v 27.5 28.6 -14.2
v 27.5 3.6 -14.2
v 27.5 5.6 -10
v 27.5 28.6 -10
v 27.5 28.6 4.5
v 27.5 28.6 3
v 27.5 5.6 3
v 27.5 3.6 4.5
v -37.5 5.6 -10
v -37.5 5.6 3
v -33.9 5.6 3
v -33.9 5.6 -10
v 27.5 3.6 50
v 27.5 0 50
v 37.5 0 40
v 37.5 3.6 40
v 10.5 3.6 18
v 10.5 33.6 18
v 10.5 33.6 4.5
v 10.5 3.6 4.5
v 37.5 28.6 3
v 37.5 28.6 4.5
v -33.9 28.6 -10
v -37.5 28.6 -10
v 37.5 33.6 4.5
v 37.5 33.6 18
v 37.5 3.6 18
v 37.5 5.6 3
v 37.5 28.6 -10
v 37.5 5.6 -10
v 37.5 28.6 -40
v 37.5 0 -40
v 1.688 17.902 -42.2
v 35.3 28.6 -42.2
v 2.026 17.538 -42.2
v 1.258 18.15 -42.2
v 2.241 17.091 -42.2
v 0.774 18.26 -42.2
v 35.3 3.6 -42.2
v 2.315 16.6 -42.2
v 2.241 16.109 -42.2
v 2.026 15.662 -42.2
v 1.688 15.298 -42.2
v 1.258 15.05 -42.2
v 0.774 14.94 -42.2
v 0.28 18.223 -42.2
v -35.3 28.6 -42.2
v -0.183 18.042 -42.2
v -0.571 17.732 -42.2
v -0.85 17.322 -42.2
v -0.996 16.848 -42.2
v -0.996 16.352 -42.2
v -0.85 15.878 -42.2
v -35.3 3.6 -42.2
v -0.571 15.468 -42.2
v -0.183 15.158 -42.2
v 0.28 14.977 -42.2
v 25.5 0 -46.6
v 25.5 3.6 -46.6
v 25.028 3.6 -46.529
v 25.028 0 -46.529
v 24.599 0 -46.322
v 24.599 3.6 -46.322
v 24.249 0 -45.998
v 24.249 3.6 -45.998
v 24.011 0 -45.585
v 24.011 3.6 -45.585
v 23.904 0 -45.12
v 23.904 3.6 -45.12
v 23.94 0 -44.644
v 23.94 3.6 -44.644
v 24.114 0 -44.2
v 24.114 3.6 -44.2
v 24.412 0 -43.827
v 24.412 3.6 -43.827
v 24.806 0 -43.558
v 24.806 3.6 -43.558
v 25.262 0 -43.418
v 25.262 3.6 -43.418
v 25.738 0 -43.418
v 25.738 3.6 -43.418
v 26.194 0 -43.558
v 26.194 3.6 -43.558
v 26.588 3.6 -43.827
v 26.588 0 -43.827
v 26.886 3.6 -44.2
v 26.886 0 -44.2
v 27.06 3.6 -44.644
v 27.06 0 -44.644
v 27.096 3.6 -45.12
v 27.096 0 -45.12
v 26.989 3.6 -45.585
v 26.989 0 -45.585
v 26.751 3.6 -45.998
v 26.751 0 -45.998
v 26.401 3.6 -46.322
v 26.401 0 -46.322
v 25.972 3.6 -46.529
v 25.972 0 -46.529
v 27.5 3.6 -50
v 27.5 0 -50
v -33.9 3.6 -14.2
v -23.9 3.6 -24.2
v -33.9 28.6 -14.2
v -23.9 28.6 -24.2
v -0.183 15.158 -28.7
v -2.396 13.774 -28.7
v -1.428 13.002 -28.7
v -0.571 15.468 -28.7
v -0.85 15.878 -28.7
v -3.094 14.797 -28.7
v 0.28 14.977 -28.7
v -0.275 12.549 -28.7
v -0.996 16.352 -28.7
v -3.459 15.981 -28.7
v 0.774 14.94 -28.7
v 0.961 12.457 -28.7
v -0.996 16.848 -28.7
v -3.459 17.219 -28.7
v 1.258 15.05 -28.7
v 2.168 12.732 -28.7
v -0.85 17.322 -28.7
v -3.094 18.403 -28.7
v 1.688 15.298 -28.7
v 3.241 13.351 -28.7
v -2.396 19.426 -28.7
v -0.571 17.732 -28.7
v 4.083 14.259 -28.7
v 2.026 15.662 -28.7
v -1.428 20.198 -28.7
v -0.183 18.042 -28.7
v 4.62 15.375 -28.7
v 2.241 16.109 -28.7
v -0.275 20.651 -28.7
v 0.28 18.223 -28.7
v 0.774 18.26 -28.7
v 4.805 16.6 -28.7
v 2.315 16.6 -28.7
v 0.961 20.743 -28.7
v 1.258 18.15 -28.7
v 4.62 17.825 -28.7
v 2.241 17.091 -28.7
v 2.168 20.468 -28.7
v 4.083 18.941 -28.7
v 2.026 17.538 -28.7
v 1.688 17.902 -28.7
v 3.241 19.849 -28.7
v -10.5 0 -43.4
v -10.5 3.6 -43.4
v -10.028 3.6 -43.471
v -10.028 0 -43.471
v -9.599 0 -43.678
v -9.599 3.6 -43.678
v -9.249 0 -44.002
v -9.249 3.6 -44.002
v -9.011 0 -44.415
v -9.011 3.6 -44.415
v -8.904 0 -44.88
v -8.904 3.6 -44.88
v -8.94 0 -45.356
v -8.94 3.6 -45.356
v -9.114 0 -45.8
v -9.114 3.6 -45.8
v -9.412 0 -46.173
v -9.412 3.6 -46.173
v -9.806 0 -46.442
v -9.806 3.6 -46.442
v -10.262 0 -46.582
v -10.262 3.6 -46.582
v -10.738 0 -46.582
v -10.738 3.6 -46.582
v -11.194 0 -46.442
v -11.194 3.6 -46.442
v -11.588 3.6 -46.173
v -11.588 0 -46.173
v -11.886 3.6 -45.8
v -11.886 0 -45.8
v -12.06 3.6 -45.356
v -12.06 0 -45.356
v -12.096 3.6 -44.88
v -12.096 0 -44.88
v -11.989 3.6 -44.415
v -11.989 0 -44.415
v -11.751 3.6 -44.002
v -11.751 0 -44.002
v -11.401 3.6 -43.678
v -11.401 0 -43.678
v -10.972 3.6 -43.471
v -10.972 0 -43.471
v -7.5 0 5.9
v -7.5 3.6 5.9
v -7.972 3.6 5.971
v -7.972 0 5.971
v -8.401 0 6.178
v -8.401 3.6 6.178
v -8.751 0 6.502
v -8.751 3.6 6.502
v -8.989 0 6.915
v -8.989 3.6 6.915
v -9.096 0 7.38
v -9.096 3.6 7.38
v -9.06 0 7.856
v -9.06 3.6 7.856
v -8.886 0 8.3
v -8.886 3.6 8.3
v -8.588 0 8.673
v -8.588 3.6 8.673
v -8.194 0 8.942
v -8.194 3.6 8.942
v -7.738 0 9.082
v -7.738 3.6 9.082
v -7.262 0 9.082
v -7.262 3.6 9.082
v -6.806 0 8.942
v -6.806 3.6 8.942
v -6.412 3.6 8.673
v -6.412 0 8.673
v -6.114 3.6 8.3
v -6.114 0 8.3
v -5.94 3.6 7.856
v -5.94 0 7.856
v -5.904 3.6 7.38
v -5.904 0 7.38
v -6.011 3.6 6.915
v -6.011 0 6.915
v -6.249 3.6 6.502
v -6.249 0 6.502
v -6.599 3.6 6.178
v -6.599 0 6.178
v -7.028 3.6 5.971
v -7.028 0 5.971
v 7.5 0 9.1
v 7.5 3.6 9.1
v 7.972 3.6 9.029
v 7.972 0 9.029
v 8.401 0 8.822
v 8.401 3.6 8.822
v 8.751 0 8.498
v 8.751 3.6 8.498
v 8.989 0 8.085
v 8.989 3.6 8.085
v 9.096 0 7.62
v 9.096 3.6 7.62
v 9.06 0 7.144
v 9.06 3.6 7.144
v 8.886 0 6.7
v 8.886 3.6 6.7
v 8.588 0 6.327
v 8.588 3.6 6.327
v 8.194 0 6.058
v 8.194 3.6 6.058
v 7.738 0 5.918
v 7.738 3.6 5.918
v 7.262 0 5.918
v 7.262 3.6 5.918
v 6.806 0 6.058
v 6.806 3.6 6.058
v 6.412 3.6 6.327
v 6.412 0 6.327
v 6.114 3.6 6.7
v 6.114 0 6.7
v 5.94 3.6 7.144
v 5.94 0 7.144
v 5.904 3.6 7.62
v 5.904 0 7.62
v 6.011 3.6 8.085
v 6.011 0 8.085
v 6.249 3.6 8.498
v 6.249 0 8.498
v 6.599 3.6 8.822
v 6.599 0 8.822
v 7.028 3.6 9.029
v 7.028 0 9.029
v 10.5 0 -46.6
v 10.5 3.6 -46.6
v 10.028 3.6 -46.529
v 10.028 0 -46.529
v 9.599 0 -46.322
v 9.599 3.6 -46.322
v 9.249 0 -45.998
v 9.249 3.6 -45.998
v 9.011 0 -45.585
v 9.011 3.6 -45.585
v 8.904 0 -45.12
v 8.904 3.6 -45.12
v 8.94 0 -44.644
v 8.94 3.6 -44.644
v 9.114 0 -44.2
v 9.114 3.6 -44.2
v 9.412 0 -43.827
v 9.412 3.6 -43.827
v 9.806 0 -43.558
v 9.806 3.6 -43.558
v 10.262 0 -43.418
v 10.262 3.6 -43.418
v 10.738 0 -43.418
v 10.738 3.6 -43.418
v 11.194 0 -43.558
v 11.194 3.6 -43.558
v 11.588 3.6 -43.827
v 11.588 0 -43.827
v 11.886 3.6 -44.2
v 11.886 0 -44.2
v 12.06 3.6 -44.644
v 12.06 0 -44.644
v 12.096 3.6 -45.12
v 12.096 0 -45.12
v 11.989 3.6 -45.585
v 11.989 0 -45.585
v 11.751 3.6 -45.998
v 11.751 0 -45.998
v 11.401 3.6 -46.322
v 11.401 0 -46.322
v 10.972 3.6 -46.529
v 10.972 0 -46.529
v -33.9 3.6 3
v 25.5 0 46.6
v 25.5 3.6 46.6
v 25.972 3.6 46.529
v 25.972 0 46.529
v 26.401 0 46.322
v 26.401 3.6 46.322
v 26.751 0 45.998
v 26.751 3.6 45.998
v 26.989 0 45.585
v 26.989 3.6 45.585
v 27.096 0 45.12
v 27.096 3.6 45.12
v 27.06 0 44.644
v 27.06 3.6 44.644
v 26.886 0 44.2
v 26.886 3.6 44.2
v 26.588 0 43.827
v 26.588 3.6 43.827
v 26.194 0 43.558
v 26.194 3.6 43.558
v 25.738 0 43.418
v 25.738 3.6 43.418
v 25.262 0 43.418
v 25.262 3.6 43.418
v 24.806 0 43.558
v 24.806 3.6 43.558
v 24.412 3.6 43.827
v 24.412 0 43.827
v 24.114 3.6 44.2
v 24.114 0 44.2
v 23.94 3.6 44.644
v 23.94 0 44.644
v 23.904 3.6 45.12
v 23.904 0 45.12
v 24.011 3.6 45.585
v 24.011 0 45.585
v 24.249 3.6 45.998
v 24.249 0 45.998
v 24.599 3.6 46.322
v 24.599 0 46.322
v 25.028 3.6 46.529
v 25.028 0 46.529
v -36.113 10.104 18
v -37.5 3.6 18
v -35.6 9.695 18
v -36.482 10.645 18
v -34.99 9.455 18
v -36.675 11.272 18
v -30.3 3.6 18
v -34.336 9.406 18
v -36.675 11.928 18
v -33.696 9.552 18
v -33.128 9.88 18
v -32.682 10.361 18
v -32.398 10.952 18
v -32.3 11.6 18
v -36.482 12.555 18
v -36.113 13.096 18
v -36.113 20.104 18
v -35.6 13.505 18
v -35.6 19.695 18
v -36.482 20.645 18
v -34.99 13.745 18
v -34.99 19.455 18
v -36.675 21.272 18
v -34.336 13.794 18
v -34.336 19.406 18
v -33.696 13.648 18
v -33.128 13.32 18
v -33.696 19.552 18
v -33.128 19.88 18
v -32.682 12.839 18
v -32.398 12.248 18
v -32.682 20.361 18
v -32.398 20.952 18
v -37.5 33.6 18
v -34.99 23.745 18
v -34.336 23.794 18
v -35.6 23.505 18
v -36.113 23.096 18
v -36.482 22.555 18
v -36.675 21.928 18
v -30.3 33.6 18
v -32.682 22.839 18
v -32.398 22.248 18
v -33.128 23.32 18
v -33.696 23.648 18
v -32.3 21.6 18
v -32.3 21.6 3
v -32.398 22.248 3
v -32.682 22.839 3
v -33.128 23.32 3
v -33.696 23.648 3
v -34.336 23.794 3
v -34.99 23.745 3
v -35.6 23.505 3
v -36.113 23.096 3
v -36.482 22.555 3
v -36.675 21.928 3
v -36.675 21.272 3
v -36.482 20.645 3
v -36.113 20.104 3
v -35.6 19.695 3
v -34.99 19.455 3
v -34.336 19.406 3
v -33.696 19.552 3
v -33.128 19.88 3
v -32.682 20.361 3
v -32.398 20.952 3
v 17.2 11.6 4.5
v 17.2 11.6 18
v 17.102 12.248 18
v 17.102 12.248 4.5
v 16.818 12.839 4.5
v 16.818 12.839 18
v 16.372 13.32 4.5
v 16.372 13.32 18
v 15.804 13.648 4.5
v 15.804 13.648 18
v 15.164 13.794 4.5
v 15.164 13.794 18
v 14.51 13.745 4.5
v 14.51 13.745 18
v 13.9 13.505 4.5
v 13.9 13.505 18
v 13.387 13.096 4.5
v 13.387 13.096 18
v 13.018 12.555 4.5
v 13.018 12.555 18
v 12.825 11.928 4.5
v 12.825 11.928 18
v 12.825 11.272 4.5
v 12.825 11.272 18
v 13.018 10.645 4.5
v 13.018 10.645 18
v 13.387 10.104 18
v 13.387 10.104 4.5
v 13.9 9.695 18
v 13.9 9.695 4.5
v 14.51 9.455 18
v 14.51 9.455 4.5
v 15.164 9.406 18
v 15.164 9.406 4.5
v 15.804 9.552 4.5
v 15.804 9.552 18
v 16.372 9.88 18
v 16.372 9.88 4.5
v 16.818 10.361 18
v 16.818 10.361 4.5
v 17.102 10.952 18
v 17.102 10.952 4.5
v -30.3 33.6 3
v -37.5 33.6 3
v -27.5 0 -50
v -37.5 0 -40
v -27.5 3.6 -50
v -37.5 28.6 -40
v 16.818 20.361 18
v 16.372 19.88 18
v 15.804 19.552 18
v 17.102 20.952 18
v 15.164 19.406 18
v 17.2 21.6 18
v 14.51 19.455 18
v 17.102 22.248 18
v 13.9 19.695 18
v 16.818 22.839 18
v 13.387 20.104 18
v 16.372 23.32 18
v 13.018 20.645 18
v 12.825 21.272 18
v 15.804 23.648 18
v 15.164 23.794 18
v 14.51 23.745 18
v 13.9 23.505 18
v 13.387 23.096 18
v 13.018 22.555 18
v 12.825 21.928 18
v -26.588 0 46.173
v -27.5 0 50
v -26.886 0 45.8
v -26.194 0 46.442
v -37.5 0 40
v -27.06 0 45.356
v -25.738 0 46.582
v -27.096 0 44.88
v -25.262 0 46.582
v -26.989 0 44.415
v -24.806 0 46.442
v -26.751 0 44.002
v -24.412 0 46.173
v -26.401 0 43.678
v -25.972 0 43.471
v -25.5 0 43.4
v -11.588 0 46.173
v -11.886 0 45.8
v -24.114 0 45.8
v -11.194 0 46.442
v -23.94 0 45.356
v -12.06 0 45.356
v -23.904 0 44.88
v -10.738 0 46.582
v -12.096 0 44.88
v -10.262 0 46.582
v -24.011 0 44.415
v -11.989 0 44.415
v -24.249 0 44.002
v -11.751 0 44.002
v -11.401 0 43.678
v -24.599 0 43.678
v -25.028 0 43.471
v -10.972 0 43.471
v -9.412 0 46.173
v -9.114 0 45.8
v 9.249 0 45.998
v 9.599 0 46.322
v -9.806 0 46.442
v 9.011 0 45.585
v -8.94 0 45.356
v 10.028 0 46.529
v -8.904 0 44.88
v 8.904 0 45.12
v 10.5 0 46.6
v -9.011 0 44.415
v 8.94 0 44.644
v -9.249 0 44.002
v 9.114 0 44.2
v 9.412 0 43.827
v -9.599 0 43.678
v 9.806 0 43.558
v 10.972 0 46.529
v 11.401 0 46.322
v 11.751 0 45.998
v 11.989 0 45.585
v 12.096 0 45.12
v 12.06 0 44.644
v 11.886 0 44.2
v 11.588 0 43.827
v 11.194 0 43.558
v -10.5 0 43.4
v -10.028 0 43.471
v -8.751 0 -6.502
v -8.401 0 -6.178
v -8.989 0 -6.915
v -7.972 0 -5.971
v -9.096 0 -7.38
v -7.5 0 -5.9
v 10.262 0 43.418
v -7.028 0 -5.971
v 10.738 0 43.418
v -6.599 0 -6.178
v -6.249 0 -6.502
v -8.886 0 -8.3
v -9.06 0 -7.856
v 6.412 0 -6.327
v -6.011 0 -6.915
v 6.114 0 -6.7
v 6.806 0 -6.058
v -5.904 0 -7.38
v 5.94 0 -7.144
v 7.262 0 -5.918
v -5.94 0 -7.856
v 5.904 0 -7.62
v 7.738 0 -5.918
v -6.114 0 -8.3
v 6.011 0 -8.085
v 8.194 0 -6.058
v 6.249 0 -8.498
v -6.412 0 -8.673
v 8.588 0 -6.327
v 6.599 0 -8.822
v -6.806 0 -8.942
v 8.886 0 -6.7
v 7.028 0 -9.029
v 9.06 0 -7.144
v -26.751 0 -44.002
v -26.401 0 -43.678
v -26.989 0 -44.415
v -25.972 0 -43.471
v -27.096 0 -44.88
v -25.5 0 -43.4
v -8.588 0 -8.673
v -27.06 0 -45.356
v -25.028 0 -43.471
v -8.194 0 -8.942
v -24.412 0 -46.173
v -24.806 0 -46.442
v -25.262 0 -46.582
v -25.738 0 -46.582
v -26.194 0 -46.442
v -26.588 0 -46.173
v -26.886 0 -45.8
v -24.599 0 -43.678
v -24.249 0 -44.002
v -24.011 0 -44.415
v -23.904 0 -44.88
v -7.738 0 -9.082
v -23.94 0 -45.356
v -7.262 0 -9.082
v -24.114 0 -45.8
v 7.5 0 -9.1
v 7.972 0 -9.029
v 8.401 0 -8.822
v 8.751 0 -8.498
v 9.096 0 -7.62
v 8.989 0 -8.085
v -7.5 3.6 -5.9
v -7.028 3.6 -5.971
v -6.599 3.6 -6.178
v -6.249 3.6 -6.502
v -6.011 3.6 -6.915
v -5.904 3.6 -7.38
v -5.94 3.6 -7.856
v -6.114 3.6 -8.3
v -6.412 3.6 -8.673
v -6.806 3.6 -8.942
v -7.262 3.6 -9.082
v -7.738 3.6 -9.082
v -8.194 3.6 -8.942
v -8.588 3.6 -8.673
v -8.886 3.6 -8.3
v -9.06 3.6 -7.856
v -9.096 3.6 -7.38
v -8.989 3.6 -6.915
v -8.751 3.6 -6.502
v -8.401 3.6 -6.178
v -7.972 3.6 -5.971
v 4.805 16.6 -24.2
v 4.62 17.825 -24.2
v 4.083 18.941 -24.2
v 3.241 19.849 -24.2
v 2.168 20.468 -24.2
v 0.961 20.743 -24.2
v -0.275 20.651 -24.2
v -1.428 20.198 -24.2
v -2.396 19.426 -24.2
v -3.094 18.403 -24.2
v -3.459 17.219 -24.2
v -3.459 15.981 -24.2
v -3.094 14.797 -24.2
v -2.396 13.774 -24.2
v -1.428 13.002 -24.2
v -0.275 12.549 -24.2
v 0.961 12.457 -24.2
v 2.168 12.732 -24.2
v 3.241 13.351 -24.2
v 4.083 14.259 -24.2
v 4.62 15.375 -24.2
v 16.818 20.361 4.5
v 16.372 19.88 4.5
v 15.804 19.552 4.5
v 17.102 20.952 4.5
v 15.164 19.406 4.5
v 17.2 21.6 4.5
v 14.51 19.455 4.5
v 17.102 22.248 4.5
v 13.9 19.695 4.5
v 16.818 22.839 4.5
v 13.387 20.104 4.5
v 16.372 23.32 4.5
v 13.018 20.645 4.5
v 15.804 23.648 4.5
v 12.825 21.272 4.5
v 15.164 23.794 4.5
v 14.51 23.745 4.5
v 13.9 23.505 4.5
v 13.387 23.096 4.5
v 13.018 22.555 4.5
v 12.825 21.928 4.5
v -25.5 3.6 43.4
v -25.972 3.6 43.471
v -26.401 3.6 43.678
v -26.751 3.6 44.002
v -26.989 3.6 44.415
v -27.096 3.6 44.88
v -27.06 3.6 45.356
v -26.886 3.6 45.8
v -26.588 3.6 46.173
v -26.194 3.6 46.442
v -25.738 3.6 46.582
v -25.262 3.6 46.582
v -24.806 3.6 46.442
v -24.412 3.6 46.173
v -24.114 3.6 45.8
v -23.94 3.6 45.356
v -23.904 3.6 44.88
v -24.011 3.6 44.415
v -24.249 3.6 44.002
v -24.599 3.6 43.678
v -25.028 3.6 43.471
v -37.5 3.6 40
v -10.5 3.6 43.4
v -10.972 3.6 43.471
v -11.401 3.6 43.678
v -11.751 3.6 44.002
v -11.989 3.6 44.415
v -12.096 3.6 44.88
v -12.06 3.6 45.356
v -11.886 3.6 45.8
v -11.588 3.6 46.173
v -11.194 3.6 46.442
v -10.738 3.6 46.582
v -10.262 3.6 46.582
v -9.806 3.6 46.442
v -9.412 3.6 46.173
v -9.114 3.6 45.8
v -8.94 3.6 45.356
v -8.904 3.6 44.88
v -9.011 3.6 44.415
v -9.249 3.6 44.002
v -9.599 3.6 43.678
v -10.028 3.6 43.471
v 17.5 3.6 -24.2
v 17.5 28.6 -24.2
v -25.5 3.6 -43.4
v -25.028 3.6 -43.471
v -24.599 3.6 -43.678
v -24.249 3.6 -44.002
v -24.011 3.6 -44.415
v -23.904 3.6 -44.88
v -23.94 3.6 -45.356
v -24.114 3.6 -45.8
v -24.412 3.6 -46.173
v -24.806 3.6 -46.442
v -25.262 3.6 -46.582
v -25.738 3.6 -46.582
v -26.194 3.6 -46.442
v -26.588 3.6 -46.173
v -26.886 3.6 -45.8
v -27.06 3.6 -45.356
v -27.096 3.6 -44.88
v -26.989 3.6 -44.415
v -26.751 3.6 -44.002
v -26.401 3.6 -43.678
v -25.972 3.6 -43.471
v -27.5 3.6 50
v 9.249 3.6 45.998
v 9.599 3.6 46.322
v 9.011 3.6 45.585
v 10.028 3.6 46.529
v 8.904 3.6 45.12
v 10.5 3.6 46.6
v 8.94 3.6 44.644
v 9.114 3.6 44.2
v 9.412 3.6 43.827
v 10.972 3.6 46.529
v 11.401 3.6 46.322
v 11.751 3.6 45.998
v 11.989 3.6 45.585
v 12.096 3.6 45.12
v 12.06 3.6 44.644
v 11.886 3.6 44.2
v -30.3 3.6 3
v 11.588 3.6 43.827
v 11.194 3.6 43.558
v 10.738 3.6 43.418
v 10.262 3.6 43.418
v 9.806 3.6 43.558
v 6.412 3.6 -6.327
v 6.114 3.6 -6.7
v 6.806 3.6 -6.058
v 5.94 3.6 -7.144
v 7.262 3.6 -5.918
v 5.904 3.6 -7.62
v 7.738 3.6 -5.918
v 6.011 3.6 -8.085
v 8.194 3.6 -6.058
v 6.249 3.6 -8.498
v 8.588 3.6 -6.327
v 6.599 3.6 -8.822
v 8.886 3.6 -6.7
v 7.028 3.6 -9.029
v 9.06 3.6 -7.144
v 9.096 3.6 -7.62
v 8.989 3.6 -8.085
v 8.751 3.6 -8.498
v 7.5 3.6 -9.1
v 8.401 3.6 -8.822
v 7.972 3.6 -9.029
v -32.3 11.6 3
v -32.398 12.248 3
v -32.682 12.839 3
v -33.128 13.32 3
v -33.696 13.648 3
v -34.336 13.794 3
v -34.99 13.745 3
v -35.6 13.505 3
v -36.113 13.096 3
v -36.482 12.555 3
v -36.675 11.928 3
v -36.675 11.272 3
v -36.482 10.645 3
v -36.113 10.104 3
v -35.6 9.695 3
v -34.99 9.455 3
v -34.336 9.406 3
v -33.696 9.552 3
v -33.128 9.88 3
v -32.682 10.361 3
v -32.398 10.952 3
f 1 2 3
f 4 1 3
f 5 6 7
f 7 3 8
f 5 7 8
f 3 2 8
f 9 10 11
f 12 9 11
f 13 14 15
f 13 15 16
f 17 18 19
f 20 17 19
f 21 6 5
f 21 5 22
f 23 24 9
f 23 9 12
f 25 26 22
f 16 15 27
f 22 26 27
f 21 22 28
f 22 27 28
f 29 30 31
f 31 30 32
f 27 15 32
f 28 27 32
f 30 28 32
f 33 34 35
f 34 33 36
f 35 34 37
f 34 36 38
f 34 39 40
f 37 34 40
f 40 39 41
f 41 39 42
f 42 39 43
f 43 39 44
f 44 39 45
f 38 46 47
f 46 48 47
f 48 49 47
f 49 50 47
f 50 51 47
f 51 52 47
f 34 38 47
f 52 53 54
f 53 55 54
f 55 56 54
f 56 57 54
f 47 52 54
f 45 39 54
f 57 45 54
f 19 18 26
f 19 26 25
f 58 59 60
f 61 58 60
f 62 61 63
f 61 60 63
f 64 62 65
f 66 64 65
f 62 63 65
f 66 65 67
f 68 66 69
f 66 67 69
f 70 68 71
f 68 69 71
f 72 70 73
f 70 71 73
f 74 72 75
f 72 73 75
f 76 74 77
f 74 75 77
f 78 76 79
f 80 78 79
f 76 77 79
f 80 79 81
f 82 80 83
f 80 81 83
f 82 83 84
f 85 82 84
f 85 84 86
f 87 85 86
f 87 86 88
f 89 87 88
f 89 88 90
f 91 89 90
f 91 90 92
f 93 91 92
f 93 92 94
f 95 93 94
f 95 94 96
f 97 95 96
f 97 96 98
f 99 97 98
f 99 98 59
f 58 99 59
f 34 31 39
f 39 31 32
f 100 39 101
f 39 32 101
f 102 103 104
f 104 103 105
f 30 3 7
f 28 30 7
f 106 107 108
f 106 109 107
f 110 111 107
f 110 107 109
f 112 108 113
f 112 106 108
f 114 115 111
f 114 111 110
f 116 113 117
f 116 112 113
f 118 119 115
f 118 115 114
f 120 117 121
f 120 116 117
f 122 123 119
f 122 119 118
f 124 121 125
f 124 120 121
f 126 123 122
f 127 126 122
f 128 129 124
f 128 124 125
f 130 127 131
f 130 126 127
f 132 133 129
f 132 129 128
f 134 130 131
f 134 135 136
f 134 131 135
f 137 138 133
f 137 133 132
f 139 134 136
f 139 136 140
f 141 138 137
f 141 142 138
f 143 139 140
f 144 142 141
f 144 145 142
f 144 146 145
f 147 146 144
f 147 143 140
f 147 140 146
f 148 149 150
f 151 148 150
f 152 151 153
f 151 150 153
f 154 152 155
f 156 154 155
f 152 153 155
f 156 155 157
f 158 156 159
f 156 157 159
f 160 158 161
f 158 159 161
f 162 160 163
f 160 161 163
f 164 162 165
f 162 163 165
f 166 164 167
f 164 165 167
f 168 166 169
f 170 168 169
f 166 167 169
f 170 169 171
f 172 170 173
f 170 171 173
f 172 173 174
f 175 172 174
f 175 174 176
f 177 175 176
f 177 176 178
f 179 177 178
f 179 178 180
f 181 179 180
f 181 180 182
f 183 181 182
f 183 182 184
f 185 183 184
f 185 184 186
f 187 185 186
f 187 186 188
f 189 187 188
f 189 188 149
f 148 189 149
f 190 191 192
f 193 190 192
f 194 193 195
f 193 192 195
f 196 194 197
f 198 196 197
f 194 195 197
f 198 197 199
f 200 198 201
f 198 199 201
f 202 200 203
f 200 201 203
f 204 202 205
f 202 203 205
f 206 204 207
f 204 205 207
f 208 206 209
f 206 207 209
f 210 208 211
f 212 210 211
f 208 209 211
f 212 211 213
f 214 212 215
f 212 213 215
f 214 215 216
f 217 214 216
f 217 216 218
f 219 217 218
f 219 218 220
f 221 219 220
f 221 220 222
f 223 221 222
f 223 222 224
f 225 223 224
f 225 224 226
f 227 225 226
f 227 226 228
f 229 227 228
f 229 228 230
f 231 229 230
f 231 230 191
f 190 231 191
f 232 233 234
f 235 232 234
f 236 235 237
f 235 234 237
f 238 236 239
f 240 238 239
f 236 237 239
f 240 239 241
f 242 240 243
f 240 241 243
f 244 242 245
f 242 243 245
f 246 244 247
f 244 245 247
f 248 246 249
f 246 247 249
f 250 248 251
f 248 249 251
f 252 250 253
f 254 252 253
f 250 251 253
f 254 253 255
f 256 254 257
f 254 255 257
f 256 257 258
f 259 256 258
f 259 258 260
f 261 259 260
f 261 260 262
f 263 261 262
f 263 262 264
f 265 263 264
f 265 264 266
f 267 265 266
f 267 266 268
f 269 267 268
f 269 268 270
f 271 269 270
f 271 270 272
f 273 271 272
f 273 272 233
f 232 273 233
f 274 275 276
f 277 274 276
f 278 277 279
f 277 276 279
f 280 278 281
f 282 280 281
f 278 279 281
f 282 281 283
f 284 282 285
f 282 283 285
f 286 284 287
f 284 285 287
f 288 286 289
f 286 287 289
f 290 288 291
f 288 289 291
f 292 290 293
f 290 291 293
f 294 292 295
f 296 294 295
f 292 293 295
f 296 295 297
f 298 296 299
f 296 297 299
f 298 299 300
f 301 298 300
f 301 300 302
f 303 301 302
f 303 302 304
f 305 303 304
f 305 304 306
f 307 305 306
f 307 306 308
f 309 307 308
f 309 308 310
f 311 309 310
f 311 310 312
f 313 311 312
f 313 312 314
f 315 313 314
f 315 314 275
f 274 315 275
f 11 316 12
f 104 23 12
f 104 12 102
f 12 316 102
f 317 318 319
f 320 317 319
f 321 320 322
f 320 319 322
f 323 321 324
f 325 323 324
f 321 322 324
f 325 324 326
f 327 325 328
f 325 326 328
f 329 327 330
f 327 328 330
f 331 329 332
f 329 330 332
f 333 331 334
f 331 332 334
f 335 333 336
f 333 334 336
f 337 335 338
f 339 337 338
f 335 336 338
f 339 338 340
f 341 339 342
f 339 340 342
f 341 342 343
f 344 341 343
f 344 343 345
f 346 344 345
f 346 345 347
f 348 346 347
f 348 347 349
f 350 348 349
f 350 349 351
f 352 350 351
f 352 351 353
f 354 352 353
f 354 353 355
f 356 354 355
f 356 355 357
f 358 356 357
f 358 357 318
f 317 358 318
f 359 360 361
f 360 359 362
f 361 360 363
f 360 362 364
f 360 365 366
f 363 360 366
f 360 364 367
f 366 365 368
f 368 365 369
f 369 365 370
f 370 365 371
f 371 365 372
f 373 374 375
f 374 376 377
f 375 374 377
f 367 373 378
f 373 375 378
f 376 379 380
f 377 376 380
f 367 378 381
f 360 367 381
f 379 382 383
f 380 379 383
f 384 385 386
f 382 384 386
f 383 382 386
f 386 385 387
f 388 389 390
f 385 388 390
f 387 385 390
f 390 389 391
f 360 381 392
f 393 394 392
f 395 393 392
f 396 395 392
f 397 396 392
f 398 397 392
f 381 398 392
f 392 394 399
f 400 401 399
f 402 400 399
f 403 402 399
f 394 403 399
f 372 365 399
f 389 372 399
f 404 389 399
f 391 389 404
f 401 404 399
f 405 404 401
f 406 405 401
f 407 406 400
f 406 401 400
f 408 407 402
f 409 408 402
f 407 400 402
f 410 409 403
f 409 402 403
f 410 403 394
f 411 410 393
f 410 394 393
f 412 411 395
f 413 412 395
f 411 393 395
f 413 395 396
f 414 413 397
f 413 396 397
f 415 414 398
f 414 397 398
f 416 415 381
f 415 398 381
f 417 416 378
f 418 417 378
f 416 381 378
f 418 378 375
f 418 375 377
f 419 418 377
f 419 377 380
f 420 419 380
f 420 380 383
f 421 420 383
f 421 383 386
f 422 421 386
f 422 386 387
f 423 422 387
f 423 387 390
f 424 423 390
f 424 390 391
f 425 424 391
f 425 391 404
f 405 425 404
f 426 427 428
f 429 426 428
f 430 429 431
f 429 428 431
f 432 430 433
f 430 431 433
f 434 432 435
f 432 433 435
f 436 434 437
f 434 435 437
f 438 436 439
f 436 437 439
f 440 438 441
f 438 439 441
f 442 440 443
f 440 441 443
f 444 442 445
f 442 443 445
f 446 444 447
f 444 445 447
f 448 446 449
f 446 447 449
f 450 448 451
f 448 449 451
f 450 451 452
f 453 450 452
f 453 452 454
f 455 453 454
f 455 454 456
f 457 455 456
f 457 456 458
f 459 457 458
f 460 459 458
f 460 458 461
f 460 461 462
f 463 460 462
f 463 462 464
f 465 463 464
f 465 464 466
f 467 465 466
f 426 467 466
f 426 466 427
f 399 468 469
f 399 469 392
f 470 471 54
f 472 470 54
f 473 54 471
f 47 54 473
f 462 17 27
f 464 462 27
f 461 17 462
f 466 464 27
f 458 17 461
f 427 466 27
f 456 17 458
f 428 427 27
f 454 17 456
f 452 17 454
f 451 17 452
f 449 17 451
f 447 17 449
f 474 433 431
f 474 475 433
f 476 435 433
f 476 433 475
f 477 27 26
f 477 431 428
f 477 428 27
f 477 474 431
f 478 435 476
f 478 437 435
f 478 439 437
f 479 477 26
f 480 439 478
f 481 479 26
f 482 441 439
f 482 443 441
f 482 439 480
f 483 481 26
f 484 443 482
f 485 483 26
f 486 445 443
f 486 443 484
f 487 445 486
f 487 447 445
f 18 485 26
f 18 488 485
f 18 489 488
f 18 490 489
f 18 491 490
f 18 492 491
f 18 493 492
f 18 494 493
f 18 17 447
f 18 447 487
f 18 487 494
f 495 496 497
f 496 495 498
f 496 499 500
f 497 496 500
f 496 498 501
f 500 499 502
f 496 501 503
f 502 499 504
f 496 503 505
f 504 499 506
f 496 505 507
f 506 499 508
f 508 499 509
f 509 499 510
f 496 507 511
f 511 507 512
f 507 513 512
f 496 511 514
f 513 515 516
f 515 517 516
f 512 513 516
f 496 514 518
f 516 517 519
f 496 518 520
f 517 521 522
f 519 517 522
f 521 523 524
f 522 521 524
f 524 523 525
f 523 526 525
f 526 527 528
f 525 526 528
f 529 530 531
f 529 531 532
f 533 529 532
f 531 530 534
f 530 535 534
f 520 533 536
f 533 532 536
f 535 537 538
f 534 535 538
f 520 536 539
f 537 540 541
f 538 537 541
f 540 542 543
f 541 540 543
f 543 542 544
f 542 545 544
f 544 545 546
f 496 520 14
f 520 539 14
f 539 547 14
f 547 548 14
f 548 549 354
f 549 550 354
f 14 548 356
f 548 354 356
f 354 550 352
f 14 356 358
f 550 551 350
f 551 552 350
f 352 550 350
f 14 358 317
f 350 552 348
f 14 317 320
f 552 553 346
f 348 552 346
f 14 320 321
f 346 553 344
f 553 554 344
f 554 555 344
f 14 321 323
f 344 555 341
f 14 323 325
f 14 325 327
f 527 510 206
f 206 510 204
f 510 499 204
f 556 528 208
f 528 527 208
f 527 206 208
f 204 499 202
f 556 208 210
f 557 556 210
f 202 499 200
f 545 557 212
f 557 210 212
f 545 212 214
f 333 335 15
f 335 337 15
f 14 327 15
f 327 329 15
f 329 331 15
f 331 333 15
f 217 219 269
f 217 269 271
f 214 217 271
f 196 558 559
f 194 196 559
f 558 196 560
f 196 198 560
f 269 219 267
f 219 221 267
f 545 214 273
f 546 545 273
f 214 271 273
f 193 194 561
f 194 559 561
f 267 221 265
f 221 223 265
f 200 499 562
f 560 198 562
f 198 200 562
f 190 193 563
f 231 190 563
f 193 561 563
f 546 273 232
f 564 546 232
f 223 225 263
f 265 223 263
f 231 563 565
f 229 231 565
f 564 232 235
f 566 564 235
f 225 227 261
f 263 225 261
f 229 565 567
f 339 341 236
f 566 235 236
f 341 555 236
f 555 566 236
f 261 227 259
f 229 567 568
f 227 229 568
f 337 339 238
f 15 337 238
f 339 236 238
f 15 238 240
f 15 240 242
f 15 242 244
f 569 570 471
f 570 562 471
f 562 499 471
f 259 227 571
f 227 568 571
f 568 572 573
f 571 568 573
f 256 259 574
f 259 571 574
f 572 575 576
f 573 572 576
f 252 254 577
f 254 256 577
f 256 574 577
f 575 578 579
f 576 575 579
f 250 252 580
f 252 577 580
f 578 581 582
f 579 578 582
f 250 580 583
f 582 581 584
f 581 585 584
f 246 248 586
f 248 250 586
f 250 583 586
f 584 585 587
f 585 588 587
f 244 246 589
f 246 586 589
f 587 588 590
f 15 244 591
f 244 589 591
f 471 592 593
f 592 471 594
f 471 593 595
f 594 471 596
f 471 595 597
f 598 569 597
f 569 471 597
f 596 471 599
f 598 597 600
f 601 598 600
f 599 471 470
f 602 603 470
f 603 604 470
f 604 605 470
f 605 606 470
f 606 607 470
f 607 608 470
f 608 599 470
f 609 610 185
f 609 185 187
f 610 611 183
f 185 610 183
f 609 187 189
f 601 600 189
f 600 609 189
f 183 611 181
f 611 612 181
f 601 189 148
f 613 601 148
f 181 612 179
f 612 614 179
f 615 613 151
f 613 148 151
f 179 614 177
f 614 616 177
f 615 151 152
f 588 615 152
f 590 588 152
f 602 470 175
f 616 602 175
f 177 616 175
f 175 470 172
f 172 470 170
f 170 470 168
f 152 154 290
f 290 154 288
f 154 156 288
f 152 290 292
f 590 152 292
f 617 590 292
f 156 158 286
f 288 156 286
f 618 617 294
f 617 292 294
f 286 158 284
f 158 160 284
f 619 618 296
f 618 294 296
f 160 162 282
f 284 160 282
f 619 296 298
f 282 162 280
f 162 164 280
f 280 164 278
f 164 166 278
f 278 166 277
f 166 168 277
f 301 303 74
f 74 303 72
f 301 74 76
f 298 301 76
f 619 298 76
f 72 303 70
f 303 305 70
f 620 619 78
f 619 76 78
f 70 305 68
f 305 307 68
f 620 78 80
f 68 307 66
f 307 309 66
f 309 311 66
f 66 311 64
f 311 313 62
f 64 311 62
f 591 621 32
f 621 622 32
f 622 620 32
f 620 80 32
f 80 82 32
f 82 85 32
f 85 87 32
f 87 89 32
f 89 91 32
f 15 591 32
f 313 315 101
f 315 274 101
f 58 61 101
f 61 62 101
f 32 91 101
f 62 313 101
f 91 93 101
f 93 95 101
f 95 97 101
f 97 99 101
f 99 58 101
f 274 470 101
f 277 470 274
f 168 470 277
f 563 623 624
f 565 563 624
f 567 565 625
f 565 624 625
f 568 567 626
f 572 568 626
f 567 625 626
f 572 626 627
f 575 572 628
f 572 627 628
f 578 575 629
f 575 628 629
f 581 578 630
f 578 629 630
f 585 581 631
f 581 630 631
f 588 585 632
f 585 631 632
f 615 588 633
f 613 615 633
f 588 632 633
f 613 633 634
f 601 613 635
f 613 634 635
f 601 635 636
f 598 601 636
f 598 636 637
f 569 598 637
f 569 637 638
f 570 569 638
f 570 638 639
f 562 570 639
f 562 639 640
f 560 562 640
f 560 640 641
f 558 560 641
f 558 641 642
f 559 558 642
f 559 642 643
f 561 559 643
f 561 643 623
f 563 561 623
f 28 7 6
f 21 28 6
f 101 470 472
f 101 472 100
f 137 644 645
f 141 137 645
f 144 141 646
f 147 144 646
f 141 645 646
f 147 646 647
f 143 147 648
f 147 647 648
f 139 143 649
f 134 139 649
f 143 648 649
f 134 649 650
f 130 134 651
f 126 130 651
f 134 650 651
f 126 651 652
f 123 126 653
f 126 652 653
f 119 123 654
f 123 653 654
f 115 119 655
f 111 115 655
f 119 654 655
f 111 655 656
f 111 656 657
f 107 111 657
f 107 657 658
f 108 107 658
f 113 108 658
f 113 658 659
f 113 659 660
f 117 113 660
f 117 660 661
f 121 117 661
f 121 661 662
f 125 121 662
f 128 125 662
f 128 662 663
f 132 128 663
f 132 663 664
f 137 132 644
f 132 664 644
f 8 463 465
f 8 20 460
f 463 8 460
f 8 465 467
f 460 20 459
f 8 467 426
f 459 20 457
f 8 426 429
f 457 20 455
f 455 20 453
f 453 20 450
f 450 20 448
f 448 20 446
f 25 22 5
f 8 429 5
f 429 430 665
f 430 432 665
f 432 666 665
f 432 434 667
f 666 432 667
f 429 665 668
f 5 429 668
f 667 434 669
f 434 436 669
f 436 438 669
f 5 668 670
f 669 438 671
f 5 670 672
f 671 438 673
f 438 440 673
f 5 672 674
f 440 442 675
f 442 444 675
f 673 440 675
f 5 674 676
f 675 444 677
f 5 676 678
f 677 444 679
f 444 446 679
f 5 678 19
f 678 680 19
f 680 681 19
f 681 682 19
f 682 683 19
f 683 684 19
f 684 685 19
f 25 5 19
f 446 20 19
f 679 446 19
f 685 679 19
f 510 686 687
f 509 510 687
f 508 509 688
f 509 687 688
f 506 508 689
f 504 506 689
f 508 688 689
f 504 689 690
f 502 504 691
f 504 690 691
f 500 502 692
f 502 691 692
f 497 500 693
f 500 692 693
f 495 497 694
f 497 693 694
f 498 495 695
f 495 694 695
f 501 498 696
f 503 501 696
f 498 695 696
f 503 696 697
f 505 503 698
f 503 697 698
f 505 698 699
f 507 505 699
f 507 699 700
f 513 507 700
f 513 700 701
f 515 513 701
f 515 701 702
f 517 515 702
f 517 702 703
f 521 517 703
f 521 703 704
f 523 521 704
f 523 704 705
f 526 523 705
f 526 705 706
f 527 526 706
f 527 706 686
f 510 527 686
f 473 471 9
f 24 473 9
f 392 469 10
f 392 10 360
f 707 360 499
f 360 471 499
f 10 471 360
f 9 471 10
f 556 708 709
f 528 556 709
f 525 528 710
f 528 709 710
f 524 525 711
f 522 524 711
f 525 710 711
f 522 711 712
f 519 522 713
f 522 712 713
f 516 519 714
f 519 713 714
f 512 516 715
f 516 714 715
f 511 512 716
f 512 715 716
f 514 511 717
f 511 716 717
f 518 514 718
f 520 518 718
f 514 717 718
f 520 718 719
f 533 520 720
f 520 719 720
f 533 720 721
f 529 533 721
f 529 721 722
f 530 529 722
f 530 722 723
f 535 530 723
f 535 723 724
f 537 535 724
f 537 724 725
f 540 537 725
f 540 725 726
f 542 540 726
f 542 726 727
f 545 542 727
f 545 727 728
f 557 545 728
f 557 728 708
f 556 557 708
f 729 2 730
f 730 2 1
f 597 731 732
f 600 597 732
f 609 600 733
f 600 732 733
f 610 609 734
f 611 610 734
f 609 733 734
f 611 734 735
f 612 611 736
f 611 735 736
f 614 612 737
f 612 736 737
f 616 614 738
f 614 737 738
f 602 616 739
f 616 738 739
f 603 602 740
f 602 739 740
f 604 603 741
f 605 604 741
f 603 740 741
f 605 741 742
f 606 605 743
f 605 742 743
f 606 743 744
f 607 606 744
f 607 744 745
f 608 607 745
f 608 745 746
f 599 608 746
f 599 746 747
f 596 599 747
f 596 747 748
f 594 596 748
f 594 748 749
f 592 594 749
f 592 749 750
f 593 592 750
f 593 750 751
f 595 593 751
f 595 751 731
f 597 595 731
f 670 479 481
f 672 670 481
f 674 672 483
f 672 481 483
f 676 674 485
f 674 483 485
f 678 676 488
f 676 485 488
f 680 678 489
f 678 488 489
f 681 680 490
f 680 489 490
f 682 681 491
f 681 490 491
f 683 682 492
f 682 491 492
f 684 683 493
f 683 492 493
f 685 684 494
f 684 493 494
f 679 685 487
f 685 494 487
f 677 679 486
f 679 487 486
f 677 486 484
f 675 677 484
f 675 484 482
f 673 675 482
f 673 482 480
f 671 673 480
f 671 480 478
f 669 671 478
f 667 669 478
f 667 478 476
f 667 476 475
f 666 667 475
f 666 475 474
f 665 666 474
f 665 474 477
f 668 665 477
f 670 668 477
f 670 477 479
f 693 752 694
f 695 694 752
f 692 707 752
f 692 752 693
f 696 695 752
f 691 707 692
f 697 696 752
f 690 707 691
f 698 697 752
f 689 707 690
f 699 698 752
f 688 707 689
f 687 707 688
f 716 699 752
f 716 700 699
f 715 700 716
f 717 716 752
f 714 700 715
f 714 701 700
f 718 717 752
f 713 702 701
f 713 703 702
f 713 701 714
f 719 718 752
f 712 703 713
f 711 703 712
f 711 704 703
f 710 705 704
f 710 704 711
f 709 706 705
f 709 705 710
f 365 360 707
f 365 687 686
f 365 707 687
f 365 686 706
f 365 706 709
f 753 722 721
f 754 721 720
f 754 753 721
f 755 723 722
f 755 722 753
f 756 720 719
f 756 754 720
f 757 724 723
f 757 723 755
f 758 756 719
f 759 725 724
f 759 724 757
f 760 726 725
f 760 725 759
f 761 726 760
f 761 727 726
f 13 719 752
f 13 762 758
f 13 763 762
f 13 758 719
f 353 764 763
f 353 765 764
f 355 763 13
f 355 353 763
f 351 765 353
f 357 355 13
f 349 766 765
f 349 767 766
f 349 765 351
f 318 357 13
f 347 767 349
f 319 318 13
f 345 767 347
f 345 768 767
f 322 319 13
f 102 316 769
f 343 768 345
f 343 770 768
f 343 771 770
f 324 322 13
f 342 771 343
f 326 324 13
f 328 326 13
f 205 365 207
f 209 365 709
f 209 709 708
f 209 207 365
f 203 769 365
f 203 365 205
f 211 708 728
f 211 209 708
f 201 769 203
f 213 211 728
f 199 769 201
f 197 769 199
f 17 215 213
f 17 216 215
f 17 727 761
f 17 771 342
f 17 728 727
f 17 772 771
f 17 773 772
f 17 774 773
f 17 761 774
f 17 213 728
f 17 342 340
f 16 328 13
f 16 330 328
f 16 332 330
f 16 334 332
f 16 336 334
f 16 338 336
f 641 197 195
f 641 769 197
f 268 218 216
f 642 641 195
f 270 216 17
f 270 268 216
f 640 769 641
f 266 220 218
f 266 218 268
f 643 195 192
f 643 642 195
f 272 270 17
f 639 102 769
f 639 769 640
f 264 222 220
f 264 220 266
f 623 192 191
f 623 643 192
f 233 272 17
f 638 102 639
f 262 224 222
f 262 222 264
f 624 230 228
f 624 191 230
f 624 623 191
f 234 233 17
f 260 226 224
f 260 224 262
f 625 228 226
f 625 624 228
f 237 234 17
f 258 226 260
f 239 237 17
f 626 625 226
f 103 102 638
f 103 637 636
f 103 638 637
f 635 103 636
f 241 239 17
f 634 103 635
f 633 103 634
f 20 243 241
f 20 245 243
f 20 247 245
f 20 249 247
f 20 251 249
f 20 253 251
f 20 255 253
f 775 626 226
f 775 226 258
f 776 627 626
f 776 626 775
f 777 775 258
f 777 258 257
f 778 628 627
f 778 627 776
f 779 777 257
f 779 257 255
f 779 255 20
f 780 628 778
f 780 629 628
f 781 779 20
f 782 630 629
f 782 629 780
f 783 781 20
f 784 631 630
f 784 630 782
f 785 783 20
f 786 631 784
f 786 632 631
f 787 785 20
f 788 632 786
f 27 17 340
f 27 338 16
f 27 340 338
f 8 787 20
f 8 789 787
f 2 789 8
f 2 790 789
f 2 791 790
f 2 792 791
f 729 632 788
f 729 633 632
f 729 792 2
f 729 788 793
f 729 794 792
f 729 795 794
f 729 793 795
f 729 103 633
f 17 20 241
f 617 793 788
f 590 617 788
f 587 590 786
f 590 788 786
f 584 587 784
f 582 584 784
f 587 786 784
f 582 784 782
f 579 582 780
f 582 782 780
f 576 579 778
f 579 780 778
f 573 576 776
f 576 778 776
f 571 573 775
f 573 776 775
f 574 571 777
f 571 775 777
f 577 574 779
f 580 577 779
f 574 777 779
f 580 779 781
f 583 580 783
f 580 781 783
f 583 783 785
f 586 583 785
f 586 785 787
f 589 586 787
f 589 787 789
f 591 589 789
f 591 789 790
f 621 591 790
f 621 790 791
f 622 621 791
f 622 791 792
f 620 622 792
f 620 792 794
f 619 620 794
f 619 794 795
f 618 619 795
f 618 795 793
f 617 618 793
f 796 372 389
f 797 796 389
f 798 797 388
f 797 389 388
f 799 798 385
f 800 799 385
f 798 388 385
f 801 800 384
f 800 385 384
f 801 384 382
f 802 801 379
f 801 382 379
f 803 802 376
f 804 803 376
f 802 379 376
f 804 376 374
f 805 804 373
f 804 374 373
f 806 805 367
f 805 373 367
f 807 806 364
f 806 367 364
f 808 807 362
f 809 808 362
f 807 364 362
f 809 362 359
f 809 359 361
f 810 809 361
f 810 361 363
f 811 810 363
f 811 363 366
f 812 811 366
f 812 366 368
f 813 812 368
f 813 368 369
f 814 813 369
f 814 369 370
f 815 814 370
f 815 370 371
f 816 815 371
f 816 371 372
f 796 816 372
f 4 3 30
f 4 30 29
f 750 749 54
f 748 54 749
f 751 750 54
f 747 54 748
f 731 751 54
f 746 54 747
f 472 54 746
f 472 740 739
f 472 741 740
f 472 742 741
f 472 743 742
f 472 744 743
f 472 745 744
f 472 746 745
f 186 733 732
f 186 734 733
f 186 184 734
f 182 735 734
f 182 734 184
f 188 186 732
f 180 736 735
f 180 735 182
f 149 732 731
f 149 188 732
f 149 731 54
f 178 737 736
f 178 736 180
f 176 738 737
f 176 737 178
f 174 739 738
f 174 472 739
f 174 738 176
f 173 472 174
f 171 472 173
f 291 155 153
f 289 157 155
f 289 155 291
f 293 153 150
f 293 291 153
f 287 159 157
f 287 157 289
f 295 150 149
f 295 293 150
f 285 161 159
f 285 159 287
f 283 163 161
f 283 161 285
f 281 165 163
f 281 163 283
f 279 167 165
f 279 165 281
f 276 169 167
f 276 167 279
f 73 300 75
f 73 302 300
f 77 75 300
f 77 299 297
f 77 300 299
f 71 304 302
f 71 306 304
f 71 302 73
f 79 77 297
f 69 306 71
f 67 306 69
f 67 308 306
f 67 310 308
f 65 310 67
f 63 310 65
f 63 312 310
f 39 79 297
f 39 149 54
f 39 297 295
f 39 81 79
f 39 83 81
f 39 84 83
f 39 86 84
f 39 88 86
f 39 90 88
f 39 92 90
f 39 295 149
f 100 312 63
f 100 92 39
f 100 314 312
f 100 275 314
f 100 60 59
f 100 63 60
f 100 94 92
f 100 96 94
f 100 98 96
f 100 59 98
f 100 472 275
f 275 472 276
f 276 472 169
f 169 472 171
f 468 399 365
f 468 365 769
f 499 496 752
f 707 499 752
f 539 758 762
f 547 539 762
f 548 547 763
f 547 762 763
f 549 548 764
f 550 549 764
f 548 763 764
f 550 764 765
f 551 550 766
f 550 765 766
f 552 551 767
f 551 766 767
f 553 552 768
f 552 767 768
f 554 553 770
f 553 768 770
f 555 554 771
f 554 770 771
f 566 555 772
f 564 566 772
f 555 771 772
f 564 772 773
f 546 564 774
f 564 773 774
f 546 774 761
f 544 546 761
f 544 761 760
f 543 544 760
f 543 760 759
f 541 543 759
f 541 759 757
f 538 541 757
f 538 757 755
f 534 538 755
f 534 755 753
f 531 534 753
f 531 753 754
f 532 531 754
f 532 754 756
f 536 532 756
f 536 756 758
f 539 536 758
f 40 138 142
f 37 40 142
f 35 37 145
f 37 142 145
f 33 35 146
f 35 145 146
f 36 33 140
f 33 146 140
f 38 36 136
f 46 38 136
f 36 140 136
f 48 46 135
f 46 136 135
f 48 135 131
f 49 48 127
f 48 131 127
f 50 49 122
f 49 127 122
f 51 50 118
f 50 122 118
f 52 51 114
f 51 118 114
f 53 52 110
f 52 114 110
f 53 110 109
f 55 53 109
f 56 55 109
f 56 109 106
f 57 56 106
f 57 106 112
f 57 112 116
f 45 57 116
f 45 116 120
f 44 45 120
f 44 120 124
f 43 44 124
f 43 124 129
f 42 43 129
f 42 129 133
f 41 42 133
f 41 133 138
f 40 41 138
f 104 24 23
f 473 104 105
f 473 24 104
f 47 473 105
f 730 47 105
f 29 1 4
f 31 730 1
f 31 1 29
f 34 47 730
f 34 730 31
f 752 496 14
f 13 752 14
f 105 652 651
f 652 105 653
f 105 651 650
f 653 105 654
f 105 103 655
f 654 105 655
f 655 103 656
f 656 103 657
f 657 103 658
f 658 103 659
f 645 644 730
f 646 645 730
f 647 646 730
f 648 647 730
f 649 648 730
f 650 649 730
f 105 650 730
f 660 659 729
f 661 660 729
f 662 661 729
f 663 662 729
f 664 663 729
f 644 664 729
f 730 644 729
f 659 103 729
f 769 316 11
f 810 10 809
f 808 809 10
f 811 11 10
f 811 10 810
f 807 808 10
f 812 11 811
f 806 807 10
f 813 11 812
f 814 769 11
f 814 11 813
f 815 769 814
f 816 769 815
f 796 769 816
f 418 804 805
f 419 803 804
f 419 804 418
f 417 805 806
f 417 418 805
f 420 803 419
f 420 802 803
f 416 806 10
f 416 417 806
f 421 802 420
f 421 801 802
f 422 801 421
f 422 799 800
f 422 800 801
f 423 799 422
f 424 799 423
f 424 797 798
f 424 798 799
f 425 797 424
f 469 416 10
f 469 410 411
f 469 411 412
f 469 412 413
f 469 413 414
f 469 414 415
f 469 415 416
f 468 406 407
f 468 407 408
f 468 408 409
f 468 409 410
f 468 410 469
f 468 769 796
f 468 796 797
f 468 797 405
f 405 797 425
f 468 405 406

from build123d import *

# Parameters (mm, degrees)
SKETCH_1_W           = 75
SKETCH_1_H           = 100
EXTRUDE_1_DEPTH      = 3.6
CHAMFER_1_SIZE       = 10
SKETCH_2_W           = 5.2
SKETCH_2_H           = 15
SKETCH_2_W_2         = 15
SKETCH_2_H_2         = 13.5
EXTRUDE_2_DEPTH      = 30
SKETCH_3_W           = 15
SKETCH_3_H           = 30
EXTRUDE_3_DEPTH      = 2
SKETCH_4_W           = 13.5
SKETCH_4_H           = 30
EXTRUDE_4_DEPTH      = 12
SKETCH_5_R           = 2.2
CUT_EXTRUDE_1_DEPTH  = 115
SKETCH_6_W           = 49.4
SKETCH_6_H           = 18
EXTRUDE_5_DEPTH      = 25
SKETCH_8_R           = 1.665
CUT_EXTRUDE_3_DEPTH  = 25
EXTRUDE_7_REACH      = 71.327
SKETCH_10_R          = 1.6
CUT_EXTRUDE_4_DEPTH  = 130
SKETCH_12_R          = 1.6
CUT_EXTRUDE_6_DEPTH  = 120
CHAMFER_2_SIZE       = 10
SKETCH_15_W          = 3.6
SKETCH_15_H          = 13
CUT_EXTRUDE_8_DEPTH  = 23
SKETCH_16_R          = 4.155
CUT_EXTRUDE_9_DEPTH  = 4.5
SKETCH_17_W          = 13
SKETCH_17_H          = 23
CUT_EXTRUDE_10_DEPTH = 23
CUT_EXTRUDE_11_DEPTH = 33


with BuildPart() as part:
    # 草图1 → 凸台-拉伸1 (new body)
    with BuildSketch(Plane(origin=(0, 0, 0), x_dir=(1, 0, 0), z_dir=(0, 1, 0))):
        Rectangle(SKETCH_1_W, SKETCH_1_H)
    extrude(amount=EXTRUDE_1_DEPTH)

    # 倒角1
    chamfer_1_edges = [part.edges().sort_by_distance(p)[0] for p in [
        (37.5, 1.8, 50),
        (-37.5, 1.8, 50),
        (-37.5, 1.8, -50),
        (37.5, 1.8, -50),
    ]]
    chamfer(chamfer_1_edges, length=CHAMFER_1_SIZE)

    # 草图2 → 凸台-拉伸2 (add)
    with BuildSketch(Plane(origin=(0, 3.6, 0), x_dir=(1, 0, 0), z_dir=(0, 1, 0))):
        with Locations((-32.9, -10.5)):
            Rectangle(SKETCH_2_W, SKETCH_2_H)
        with Locations((18, -11.25)):
            Rectangle(SKETCH_2_W_2, SKETCH_2_H_2)
    extrude(amount=EXTRUDE_2_DEPTH)

    # 草图3 → 凸台-拉伸3 (add)
    with BuildSketch(Plane.ZY.offset(35.5)):
        with Locations((10.5, 18.6)):
            Rectangle(SKETCH_3_W, SKETCH_3_H)
    extrude(amount=EXTRUDE_3_DEPTH)

    # 草图4 → 凸台-拉伸4 (add)
    with BuildSketch(Plane(origin=(25.5, 0, 0), x_dir=(0, 0, -1), z_dir=(1, 0, 0))):
        with Locations((-11.25, 18.6)):
            Rectangle(SKETCH_4_W, SKETCH_4_H)
    extrude(amount=EXTRUDE_4_DEPTH)

    # 草图5 → 切除-拉伸1 (cut)
    with BuildSketch(Plane.XY.offset(18)):
        with Locations((-34.5, 21.6)):
            Circle(SKETCH_5_R)
        with Locations((-34.5, 11.6)):
            Circle(SKETCH_5_R)
        with Locations((15, 21.6)):
            Circle(SKETCH_5_R)
        with Locations((15, 11.6)):
            Circle(SKETCH_5_R)
    extrude(amount=-CUT_EXTRUDE_1_DEPTH, mode=Mode.SUBTRACT)

    # 草图6 → 凸台-拉伸5 (add)
    with BuildSketch(Plane(origin=(0, 3.6, 0), x_dir=(1, 0, 0), z_dir=(0, 1, 0))):
        with Locations((2.8, 33.2)):
            Rectangle(SKETCH_6_W, SKETCH_6_H)
    extrude(amount=EXTRUDE_5_DEPTH)

    # 草图8 → 切除-拉伸3 (cut)
    with BuildSketch(Plane.XY.offset(-24.2)):
        with Locations((0.65, 16.6)):
            Circle(SKETCH_8_R)
    extrude(amount=-CUT_EXTRUDE_3_DEPTH, mode=Mode.SUBTRACT)

    # 凸台-拉伸7: up to this face of the body (flat: up to its plane)
    extrude_7_end = Plane(part.part.faces().sort_by_distance((2.8, 28.6, -33.2))[0])
    # 草图9 → 凸台-拉伸7 (add, up to the picked face)
    with BuildSketch(Plane(origin=(0, 3.6, 0), x_dir=(1, 0, 0), z_dir=(0, 1, 0)), mode=Mode.PRIVATE) as extrude_7_sk1:
        Polygon((-21.9, 42.2), (-37.5, 42.2), (-37.5, -3), (-33.9, -3), (-33.9, 24.2), (-21.9, 24.2), align=None)
    extrude_7_tool1 = split(extrude(extrude_7_sk1.sketch, amount=EXTRUDE_7_REACH, mode=Mode.PRIVATE), bisect_by=extrude_7_end, keep=Keep.BOTH, mode=Mode.PRIVATE)
    # 草图9 → 凸台-拉伸7 (add, up to the picked face)
    with BuildSketch(Plane(origin=(0, 3.6, 0), x_dir=(1, 0, 0), z_dir=(0, 1, 0)), mode=Mode.PRIVATE) as extrude_7_sk2:
        Polygon((37.5, -4.5), (37.5, 42.2), (27.5, 42.2), (27.5, 24.2), (27.5, -4.5), align=None)
    extrude_7_tool2 = split(extrude(extrude_7_sk2.sketch, amount=EXTRUDE_7_REACH, mode=Mode.PRIVATE), bisect_by=extrude_7_end, keep=Keep.BOTH, mode=Mode.PRIVATE)
    add(extrude_7_tool1.solids().sort_by(Axis((-31.251331, 3.6, -27.356654), (0, 1, 0)))[0])
    add(extrude_7_tool2.solids().sort_by(Axis((32.5, 3.6, -18.85), (0, 1, 0)))[0])

    # 草图10 → 切除-拉伸4 (cut)
    with BuildSketch(Plane(origin=(0, 3.6, 0), x_dir=(1, 0, 0), z_dir=(0, 1, 0))):
        with Locations(Location((-7.5, 7.5, 0), (0, 0, 270))):
            Circle(SKETCH_10_R)
        with Locations(Location((7.5, 7.5, 0), (0, 0, 90))):
            Circle(SKETCH_10_R)
        with Locations(Location((7.5, -7.5, 0), (0, 0, 270))):
            Circle(SKETCH_10_R)
        with Locations(Location((-7.5, -7.5, 0), (0, 0, 90))):
            Circle(SKETCH_10_R)
    extrude(amount=-CUT_EXTRUDE_4_DEPTH, mode=Mode.SUBTRACT)

    # 草图12 → 切除-拉伸6 (cut)
    with BuildSketch(Plane(origin=(0, 3.6, 0), x_dir=(1, 0, 0), z_dir=(0, 1, 0))):
        with Locations(Location((-25.5, 45, 0), (0, 0, 270))):
            Circle(SKETCH_12_R)
        with Locations(Location((-10.5, 45, 0), (0, 0, 270))):
            Circle(SKETCH_12_R)
        with Locations(Location((10.5, 45, 0), (0, 0, 90))):
            Circle(SKETCH_12_R)
        with Locations(Location((25.5, 45, 0), (0, 0, 90))):
            Circle(SKETCH_12_R)
        with Locations(Location((25.5, -45, 0), (0, 0, 270))):
            Circle(SKETCH_12_R)
        with Locations(Location((10.5, -45, 0), (0, 0, 270))):
            Circle(SKETCH_12_R)
        with Locations(Location((-10.5, -45, 0), (0, 0, 90))):
            Circle(SKETCH_12_R)
        with Locations(Location((-25.5, -45, 0), (0, 0, 90))):
            Circle(SKETCH_12_R)
    extrude(amount=-CUT_EXTRUDE_6_DEPTH, mode=Mode.SUBTRACT)

    # 倒角2
    chamfer_2_edges = [part.edges().sort_by_distance(p)[0] for p in [
        (27.5, 16.1, -24.2),
        (-33.9, 16.1, -24.2),
    ]]
    chamfer(chamfer_2_edges, length=CHAMFER_2_SIZE)

    # 草图15 → 切除-拉伸8 (cut)
    with BuildSketch(Plane(origin=(0, 28.6, 0), x_dir=(1, 0, 0), z_dir=(0, 1, 0))):
        with Locations((-35.7, 3.5)):
            Rectangle(SKETCH_15_W, SKETCH_15_H)
    extrude(amount=-CUT_EXTRUDE_8_DEPTH, mode=Mode.SUBTRACT)

    # 草图16 → 切除-拉伸9 (cut)
    with BuildSketch(Plane.XY.offset(-24.2)):
        with Locations((0.65, 16.6)):
            Circle(SKETCH_16_R)
    extrude(amount=-CUT_EXTRUDE_9_DEPTH, mode=Mode.SUBTRACT)

    # 草图17 → 切除-拉伸10 (cut)
    with BuildSketch(Plane.ZY.offset(-27.5)):
        with Locations((-3.5, 17.1)):
            Rectangle(SKETCH_17_W, SKETCH_17_H)
    extrude(amount=-CUT_EXTRUDE_10_DEPTH, mode=Mode.SUBTRACT)

    # 草图18 → 切除-拉伸11 (cut)
    with BuildSketch(Plane.XZ):
        Polygon((-37.5, -40), (-35.3, -42.2), (-37.5, -42.2), align=None)
        Polygon((37.5, -42.2), (37.5, -40), (35.3, -42.2), align=None)
    extrude(amount=-CUT_EXTRUDE_11_DEPTH, mode=Mode.SUBTRACT)


solid = part.part
